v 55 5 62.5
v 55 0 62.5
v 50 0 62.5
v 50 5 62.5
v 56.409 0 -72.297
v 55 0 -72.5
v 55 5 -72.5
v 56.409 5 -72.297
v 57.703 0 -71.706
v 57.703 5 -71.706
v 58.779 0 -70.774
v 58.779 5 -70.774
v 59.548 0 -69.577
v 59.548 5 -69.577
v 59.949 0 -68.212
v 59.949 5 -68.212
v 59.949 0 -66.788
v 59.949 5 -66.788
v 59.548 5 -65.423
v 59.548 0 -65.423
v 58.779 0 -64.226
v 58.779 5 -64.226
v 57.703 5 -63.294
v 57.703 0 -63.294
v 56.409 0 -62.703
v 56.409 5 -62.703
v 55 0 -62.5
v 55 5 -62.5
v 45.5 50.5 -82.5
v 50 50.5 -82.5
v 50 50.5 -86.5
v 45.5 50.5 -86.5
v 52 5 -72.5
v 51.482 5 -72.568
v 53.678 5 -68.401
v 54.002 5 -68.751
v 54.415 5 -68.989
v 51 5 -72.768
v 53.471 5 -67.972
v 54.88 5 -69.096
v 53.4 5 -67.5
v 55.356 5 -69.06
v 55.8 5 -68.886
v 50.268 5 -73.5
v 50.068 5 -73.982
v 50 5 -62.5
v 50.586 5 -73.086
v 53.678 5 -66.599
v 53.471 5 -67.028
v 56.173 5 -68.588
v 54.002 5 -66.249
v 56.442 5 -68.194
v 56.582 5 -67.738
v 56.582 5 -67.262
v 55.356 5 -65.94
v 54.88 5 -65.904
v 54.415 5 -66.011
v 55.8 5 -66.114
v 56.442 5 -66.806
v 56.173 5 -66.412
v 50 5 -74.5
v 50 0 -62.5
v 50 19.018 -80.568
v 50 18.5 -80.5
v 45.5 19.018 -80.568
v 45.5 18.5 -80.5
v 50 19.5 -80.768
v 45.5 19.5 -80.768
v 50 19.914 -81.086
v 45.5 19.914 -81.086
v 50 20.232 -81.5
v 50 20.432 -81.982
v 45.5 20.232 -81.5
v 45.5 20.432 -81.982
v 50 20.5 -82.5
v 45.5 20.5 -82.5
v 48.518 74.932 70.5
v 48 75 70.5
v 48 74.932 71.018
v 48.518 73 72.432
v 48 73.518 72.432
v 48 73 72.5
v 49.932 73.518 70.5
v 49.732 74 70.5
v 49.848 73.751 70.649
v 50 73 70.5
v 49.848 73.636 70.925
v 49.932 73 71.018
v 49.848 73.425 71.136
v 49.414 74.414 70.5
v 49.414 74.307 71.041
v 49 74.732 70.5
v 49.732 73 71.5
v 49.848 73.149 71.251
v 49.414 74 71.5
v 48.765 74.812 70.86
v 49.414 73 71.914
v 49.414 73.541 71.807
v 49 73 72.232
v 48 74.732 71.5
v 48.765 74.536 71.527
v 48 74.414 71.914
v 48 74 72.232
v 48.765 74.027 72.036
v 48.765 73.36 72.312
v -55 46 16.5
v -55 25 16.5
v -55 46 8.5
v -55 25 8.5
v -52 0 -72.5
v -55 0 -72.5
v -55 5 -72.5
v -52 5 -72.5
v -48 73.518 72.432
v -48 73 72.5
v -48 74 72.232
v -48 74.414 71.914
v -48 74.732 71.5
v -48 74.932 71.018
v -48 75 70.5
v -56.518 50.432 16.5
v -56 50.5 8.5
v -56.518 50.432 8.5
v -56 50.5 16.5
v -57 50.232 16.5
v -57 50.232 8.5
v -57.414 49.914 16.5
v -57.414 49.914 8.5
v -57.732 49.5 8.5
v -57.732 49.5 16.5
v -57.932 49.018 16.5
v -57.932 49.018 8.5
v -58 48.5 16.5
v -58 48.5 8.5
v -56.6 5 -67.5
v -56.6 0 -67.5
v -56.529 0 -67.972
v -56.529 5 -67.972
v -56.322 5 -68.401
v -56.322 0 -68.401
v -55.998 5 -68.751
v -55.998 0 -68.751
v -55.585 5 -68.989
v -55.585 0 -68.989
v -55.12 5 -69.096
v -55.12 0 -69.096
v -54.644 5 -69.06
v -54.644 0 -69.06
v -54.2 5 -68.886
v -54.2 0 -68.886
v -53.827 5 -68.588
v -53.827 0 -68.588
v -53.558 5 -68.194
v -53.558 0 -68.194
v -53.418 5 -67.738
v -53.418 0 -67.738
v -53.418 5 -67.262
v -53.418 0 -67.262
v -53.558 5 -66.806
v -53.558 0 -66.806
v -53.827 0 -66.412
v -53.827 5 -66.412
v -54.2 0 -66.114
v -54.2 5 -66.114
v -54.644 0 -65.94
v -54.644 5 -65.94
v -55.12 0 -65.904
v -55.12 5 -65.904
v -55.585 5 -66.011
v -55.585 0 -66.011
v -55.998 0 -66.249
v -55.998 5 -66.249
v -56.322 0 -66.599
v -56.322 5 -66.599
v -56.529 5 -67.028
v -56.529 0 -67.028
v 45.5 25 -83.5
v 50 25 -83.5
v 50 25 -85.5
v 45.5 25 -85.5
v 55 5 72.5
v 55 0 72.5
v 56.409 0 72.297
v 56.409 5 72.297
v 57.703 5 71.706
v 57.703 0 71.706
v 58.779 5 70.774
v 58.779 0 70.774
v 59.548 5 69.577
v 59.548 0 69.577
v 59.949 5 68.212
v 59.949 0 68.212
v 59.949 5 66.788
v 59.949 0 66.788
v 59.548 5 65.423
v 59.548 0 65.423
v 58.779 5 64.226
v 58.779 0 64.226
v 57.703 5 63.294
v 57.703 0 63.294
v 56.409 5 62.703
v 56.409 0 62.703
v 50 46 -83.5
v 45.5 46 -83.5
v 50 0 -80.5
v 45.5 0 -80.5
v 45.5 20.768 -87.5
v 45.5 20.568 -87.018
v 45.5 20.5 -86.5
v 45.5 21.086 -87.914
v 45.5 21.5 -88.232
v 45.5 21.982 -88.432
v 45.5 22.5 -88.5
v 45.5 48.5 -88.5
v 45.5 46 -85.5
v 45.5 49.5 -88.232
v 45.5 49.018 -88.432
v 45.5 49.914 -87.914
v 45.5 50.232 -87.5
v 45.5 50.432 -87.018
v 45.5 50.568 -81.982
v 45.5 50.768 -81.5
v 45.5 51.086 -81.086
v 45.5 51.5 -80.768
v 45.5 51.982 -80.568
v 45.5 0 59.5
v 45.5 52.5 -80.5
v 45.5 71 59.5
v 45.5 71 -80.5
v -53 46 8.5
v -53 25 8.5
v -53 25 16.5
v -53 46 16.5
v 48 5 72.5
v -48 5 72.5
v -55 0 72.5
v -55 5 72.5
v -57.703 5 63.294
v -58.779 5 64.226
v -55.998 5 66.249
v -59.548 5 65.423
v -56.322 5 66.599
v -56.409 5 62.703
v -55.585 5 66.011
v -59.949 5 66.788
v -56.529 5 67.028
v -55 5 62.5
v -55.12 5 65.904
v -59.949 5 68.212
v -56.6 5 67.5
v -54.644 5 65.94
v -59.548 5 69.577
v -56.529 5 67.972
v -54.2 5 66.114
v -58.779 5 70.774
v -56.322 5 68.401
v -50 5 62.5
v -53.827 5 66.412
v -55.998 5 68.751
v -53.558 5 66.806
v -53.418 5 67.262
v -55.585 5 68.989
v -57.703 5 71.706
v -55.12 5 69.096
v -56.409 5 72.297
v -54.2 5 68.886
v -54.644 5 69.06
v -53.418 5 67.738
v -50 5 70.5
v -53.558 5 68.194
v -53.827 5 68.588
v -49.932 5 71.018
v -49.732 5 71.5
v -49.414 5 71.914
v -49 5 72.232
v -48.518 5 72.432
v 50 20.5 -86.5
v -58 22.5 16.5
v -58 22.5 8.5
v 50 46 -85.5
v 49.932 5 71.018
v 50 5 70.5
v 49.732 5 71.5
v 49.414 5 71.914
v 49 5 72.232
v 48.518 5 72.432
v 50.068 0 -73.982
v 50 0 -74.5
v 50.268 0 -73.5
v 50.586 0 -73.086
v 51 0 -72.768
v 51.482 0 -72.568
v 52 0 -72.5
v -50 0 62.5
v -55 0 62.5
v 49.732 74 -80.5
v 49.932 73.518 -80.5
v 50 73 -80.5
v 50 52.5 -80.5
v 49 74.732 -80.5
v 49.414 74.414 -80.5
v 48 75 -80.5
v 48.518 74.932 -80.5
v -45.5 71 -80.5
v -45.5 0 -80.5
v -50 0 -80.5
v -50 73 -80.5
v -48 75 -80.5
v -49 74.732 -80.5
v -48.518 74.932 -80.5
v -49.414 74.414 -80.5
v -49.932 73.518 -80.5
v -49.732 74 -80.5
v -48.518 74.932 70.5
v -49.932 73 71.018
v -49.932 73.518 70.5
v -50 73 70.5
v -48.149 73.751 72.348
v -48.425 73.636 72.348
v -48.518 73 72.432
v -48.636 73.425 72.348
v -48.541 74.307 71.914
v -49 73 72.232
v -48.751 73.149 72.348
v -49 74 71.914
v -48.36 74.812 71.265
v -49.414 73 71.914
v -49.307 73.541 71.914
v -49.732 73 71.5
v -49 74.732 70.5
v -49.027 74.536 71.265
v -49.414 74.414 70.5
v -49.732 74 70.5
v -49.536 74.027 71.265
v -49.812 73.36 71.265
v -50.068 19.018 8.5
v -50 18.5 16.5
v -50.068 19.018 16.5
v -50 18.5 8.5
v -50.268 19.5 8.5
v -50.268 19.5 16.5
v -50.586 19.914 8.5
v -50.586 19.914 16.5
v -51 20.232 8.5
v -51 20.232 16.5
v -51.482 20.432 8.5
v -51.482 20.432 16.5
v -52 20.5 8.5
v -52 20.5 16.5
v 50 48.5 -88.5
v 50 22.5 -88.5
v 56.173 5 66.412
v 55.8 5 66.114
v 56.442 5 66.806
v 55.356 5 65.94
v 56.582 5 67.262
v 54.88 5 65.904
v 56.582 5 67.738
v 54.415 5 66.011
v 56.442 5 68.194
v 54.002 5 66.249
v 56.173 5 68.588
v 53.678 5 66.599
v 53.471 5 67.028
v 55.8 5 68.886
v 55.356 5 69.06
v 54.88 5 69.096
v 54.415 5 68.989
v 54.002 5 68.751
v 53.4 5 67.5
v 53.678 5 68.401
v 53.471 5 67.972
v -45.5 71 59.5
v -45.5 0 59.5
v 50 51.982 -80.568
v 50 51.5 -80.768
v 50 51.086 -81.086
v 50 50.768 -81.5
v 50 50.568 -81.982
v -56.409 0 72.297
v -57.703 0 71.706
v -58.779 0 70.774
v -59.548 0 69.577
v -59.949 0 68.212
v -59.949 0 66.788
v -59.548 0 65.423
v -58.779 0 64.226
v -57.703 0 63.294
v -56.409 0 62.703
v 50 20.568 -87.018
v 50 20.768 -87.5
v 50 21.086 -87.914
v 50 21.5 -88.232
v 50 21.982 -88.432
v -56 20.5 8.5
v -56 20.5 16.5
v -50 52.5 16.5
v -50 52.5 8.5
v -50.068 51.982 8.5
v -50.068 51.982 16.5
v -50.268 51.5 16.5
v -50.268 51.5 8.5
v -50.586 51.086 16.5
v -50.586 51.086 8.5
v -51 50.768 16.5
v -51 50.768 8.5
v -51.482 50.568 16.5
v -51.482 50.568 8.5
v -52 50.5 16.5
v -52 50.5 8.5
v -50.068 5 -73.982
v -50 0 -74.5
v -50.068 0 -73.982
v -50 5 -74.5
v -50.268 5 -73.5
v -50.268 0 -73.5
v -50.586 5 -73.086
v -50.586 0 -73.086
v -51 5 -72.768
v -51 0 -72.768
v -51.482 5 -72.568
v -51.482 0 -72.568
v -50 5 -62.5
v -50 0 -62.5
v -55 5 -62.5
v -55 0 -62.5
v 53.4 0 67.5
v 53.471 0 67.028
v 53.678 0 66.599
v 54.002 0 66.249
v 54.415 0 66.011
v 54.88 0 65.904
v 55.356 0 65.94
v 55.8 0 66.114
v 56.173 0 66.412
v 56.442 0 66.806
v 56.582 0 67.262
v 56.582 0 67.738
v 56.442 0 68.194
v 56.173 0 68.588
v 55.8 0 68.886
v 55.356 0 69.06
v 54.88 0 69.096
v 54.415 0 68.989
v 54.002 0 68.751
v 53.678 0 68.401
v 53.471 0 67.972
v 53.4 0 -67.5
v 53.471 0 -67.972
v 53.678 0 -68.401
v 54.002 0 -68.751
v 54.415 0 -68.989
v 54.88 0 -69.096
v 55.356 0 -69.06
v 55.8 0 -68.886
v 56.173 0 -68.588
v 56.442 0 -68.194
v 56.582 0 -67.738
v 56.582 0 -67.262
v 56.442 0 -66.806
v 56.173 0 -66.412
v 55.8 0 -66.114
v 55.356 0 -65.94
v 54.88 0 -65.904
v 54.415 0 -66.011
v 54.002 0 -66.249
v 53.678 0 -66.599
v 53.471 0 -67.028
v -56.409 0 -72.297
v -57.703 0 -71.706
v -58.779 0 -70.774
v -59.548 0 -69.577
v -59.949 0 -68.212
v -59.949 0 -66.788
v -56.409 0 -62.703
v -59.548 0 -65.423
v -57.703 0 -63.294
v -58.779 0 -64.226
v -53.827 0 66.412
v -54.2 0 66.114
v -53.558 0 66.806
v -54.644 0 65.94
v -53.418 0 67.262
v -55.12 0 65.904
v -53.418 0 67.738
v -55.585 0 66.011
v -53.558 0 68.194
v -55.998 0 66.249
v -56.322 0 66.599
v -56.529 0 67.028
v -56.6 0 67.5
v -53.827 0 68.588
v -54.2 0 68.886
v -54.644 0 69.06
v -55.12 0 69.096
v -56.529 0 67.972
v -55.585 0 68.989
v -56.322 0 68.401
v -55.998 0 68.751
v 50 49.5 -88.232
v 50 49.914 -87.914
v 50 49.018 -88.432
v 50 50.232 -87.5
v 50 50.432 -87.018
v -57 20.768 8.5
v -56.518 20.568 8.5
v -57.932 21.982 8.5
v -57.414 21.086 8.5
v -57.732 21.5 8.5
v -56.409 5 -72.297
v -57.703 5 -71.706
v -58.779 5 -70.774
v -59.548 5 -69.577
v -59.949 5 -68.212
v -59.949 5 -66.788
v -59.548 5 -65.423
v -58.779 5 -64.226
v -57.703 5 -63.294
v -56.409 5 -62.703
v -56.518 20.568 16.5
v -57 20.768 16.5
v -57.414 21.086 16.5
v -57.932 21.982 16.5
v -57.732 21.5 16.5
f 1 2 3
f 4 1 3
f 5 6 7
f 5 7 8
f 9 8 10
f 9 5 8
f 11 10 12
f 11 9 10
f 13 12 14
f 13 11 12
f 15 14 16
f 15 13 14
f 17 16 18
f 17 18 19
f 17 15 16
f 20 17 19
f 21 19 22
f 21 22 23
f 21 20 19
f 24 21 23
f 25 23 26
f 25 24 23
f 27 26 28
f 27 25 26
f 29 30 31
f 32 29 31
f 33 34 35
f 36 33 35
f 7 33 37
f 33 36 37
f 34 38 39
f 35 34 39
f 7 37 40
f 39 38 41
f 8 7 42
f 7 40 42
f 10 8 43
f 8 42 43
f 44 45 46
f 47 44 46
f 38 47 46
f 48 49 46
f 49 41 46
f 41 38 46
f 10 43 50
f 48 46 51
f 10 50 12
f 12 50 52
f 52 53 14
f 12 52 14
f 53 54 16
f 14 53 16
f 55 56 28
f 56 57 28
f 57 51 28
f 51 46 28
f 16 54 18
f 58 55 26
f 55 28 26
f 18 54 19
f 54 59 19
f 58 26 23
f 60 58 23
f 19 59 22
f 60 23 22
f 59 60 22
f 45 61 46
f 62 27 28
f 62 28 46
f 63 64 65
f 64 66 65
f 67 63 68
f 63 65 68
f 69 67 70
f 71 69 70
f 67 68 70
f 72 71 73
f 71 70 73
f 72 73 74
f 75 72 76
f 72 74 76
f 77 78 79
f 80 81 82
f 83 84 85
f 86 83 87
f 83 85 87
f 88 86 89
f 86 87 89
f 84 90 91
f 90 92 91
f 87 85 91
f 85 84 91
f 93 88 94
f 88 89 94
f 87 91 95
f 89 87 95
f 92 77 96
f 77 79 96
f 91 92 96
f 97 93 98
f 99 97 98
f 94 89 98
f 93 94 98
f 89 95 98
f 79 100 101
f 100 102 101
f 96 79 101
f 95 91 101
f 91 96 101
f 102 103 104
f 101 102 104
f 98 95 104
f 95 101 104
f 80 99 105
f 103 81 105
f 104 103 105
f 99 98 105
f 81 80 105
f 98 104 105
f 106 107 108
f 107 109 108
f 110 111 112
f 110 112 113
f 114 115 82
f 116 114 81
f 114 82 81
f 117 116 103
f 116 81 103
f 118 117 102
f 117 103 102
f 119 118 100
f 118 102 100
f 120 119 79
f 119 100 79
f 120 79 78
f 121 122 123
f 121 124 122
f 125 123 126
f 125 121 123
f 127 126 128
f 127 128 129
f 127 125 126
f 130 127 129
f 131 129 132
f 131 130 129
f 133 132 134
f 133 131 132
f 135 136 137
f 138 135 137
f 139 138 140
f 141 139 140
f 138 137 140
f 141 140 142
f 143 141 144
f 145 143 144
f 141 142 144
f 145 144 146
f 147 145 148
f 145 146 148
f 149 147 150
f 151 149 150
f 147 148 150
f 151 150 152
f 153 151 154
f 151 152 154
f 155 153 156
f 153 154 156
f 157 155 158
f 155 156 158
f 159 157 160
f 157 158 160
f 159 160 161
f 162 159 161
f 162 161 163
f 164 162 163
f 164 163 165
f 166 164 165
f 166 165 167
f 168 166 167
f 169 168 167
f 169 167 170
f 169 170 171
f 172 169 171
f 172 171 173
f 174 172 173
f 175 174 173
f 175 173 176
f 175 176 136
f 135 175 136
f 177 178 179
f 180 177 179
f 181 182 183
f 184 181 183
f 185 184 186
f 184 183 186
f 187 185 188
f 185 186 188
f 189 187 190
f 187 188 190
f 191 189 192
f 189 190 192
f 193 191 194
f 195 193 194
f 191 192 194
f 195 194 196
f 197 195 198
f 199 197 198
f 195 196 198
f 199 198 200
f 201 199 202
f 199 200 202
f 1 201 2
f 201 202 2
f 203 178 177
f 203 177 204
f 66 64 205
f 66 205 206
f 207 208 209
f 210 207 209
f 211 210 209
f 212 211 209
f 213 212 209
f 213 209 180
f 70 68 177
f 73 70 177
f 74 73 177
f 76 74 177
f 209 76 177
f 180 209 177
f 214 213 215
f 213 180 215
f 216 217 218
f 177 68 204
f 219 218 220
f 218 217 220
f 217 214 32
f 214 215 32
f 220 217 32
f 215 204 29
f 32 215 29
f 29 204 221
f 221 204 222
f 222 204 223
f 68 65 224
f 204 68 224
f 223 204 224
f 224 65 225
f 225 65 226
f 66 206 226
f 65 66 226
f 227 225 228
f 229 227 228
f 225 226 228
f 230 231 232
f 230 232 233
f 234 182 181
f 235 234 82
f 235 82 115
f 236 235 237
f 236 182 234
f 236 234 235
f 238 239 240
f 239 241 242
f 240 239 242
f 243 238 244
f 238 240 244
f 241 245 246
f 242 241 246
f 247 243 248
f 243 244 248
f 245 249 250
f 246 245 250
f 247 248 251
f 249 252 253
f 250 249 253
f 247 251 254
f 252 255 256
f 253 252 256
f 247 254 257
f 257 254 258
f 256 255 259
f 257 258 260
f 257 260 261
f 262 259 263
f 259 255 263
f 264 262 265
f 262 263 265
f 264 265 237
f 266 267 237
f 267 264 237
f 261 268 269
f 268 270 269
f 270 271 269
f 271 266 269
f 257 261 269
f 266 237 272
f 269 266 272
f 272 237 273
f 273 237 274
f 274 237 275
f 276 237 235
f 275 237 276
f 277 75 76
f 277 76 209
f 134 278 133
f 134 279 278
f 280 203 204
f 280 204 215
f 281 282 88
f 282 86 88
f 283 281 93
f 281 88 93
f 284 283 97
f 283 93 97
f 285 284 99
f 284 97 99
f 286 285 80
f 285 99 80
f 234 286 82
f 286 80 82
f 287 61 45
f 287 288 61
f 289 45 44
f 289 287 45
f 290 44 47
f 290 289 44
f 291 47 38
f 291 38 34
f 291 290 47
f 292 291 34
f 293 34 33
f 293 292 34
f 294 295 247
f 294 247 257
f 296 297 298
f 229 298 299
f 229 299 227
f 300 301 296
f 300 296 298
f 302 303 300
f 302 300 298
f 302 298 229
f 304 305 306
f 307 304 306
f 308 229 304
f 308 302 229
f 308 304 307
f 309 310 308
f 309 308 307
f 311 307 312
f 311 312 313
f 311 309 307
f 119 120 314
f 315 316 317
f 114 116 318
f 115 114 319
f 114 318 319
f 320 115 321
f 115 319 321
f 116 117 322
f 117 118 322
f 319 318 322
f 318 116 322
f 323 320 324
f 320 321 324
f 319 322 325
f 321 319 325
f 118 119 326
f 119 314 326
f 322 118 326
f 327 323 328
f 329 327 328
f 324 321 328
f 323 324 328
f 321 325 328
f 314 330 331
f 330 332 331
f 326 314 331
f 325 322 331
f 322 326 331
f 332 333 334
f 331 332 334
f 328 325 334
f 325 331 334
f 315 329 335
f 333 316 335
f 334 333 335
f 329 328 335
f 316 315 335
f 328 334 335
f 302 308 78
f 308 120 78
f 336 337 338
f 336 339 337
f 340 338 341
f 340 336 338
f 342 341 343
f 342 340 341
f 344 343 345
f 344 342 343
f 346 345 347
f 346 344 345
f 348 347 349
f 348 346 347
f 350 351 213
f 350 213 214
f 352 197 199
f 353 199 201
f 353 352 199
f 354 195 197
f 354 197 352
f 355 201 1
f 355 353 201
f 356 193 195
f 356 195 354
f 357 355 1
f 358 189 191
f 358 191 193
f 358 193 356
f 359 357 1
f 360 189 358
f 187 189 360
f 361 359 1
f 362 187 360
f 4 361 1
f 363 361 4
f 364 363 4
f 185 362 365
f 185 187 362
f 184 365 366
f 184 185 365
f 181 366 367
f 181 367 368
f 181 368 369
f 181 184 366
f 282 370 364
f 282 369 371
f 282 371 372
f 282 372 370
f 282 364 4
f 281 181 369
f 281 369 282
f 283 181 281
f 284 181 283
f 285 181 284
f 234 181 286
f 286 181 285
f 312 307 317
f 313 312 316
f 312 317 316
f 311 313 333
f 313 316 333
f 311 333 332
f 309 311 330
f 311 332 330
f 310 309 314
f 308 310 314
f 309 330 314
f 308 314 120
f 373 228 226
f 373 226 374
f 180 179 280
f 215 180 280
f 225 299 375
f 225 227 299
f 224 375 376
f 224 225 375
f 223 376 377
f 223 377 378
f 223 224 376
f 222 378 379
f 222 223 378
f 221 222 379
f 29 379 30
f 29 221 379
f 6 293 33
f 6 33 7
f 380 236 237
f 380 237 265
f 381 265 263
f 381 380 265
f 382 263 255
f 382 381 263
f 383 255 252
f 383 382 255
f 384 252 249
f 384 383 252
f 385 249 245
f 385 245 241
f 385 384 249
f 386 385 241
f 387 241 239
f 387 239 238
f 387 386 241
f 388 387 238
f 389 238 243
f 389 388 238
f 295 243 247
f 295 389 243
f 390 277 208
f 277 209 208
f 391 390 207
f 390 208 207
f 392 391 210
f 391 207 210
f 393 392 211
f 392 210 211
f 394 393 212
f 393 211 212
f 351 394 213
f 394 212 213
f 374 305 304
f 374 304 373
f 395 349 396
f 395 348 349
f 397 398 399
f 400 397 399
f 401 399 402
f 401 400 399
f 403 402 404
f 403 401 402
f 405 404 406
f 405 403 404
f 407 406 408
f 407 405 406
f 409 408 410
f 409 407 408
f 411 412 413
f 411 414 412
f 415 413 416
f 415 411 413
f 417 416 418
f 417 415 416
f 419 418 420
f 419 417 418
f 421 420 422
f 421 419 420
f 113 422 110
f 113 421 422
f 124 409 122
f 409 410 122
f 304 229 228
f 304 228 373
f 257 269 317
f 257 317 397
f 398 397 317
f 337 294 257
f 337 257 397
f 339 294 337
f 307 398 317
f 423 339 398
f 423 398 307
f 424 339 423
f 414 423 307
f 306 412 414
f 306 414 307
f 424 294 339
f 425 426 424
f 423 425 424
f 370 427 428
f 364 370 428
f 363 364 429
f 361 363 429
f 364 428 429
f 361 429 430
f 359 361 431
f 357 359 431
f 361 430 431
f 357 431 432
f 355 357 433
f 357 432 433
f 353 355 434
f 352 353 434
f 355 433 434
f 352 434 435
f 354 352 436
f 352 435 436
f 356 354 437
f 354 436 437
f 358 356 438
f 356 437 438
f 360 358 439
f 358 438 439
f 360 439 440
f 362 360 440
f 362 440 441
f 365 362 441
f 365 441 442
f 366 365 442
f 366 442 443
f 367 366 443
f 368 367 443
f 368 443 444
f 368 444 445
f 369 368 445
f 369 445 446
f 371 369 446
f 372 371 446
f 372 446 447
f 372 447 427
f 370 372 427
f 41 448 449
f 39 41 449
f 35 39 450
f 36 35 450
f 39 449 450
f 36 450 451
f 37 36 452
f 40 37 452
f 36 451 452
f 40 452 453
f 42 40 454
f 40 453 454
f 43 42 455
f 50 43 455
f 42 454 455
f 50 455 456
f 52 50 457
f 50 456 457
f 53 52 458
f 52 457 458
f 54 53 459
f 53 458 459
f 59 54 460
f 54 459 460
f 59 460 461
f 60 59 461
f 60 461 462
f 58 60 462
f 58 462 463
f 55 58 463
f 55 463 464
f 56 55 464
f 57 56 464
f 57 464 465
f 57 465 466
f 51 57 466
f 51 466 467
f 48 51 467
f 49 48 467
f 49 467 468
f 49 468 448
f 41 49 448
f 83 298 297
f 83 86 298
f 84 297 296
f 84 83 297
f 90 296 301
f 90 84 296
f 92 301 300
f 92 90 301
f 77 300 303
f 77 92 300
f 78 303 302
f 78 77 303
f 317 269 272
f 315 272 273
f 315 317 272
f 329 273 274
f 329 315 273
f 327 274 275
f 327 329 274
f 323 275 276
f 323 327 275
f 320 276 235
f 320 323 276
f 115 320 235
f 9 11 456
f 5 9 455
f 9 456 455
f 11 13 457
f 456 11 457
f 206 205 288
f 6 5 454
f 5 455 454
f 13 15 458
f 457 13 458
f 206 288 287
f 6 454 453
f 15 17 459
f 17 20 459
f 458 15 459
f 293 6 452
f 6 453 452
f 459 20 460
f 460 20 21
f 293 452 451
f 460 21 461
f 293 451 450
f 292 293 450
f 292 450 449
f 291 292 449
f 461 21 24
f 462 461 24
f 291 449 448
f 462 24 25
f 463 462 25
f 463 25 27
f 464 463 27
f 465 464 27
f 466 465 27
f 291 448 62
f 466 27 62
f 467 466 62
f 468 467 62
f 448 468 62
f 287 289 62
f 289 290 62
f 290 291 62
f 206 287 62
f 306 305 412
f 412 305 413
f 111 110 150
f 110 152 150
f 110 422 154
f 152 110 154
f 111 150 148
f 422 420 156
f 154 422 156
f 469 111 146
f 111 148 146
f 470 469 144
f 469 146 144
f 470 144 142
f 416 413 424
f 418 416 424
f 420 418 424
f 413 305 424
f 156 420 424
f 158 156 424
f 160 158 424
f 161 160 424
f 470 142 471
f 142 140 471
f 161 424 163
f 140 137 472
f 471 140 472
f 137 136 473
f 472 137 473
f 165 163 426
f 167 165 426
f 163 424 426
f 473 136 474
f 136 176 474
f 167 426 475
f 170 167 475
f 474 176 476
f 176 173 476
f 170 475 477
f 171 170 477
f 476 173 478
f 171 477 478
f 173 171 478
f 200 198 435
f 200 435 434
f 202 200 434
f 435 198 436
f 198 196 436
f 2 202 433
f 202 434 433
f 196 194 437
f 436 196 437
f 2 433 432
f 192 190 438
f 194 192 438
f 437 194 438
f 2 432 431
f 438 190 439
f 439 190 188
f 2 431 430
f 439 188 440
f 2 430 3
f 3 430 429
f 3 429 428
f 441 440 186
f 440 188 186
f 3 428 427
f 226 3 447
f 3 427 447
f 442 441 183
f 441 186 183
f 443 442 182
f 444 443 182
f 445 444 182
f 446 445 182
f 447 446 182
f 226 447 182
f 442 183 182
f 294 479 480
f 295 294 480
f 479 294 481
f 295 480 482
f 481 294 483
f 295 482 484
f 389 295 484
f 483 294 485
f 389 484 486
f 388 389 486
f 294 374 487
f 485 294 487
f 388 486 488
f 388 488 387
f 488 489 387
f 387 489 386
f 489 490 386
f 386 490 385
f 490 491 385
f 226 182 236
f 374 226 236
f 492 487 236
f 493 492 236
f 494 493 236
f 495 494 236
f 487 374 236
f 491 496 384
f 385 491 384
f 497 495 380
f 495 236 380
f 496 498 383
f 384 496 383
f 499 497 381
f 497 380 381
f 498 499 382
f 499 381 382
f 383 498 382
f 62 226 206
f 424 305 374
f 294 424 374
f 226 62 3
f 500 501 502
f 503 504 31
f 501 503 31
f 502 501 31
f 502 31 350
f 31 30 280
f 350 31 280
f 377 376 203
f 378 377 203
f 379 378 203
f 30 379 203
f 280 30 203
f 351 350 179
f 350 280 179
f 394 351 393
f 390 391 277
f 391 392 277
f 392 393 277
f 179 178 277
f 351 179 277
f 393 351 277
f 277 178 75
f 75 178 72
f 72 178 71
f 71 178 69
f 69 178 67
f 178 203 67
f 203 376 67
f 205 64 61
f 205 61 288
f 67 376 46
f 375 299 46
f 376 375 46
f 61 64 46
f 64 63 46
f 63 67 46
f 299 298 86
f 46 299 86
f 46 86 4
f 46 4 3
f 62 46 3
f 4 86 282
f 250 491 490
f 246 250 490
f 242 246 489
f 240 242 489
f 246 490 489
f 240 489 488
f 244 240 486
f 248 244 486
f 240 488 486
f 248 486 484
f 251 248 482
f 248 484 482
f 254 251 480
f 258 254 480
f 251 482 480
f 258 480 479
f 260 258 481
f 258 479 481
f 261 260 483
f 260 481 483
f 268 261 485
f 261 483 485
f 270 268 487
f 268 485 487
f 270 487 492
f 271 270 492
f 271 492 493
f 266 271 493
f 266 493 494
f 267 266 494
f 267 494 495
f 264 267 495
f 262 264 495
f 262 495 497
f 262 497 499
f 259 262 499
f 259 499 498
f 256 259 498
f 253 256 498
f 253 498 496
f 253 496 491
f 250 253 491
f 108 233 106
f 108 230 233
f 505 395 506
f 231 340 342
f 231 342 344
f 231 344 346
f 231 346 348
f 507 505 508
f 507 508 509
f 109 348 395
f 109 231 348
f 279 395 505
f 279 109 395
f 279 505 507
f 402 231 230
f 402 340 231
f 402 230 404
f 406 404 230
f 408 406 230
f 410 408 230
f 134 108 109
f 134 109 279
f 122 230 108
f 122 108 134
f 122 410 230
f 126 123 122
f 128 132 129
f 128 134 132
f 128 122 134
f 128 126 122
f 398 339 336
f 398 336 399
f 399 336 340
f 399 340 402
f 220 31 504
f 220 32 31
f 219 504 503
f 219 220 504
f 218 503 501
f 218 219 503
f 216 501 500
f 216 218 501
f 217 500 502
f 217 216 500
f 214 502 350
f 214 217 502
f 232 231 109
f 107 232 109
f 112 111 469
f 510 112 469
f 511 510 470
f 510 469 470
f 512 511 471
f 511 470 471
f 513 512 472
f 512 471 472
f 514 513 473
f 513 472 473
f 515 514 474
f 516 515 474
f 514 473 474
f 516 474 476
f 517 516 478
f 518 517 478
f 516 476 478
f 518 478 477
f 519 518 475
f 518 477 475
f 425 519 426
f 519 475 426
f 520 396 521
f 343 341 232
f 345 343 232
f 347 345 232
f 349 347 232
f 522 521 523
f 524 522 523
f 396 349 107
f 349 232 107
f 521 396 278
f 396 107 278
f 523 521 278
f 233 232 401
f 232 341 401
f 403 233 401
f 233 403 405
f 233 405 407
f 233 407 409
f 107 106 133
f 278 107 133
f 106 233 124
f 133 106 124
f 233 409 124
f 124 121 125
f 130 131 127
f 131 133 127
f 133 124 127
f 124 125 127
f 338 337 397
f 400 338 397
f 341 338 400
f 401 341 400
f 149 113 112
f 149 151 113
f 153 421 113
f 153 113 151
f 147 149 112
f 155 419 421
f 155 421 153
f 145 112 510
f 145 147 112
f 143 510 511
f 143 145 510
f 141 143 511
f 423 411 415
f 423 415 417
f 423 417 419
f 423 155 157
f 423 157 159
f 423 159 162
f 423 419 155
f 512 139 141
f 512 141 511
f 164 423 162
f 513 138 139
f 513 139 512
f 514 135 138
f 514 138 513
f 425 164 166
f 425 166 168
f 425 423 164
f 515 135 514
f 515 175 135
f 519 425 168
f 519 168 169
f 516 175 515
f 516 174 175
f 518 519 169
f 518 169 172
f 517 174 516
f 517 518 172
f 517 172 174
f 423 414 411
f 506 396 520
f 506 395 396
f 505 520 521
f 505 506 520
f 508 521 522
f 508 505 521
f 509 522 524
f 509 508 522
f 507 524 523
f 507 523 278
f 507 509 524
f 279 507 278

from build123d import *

# Parameters (mm, degrees)
SKETCH2_W                = 100
SKETCH2_H                = 145
BOSS_EXTRUDE1_DEPTH      = 75
SKETCH3_W                = 91
SKETCH3_H                = 140
CUT_EXTRUDE1_DEPTH       = 71
BOSS_EXTRUDE2_DEPTH      = 5
M3_CLEARANCE_HOLE2_D     = 3.2
M3_CLEARANCE_HOLE2_DEPTH = 12
M3_CLEARANCE_HOLE2_TIP   = 0.96137699
SKETCH11_W               = 8
SKETCH11_H               = 30
SKETCH11_W_2             = 2
SKETCH11_H_2             = 21
BOSS_EXTRUDE4_DEPTH      = 4
SKETCH13_W               = 91
SKETCH13_H               = 71
BOSS_EXTRUDE6_DEPTH      = 8
BOSS_EXTRUDE7_DEPTH      = 8
SKETCH12_W               = 8
SKETCH12_H               = 30
SKETCH12_W_2             = 2
SKETCH12_H_2             = 21
BOSS_EXTRUDE5_DEPTH      = 4.5
FILLET1_R                = 2


with BuildPart() as part:
    # Sketch2 → Boss-Extrude1 (new body)
    with BuildSketch(Plane(origin=(0, 0, 0), x_dir=(1, 0, 0), z_dir=(0, 1, 0))):
        Rectangle(SKETCH2_W, SKETCH2_H)
    extrude(amount=BOSS_EXTRUDE1_DEPTH)

    # Sketch3 → Cut-Extrude1 (cut)
    with BuildSketch(Plane.XZ):
        with Locations((0, -2.5)):
            Rectangle(SKETCH3_W, SKETCH3_H)
    extrude(amount=-CUT_EXTRUDE1_DEPTH, mode=Mode.SUBTRACT)

    # Sketch4 → Boss-Extrude2 (add)
    with BuildSketch(Plane.XZ):
        with BuildLine():
            Line((-50, 72.5), (-55, 72.5))
            ThreePointArc((-55, 72.5), (-60, 67.5), (-55, 62.5))
            Line((-55, 62.5), (-50, 62.5))
            Line((-50, 62.5), (-50, 72.5))
        make_face()
        with BuildLine():
            Line((50, 72.5), (55, 72.5))
            ThreePointArc((55, 72.5), (60, 67.5), (55, 62.5))
            Line((55, 62.5), (50, 62.5))
            Line((50, 62.5), (50, 72.5))
        make_face()
        with BuildLine():
            Line((-50, -72.5), (-55, -72.5))
            ThreePointArc((-55, -72.5), (-60, -67.5), (-55, -62.5))
            Line((-55, -62.5), (-50, -62.5))
            Line((-50, -62.5), (-50, -72.5))
        make_face()
        with BuildLine():
            Line((50, -72.5), (55, -72.5))
            ThreePointArc((55, -72.5), (60, -67.5), (55, -62.5))
            Line((55, -62.5), (50, -62.5))
            Line((50, -62.5), (50, -72.5))
        make_face()
    extrude(amount=-BOSS_EXTRUDE2_DEPTH)

    # M3 Clearance Hole2
    with Locations(Plane(origin=(0, 5, 0), x_dir=(1, 0, 0), z_dir=(0, 1, 0))):
        with Locations((-55, 67.5), (55, 67.5), (55, -67.5), (-55, -67.5)):
            Hole(M3_CLEARANCE_HOLE2_D / 2, depth=M3_CLEARANCE_HOLE2_DEPTH)
            with Locations((0, 0, -(M3_CLEARANCE_HOLE2_DEPTH + M3_CLEARANCE_HOLE2_TIP / 2))):  # 118° drill point
                Cone(0, M3_CLEARANCE_HOLE2_D / 2, M3_CLEARANCE_HOLE2_TIP, mode=Mode.SUBTRACT)

    # Sketch11 → Boss-Extrude4 (add, symmetric)
    with BuildSketch(Plane(origin=(0, 0, 12.5), x_dir=(-1, 0, 0), z_dir=(0, 0, -1))):
        with Locations((54, 35.5)):
            Rectangle(SKETCH11_W, SKETCH11_H)
        with Locations((54, 35.5)):
            Rectangle(SKETCH11_W_2, SKETCH11_H_2, mode=Mode.SUBTRACT)
    extrude(amount=BOSS_EXTRUDE4_DEPTH, both=True)

    # Sketch13 → Boss-Extrude6 (add)
    with BuildSketch(Plane(origin=(0, 0, 67.5), x_dir=(-1, 0, 0), z_dir=(0, 0, -1))):
        with Locations((0, 35.5)):
            Rectangle(SKETCH13_W, SKETCH13_H)
    extrude(amount=BOSS_EXTRUDE6_DEPTH)

    # Sketch15 → Boss-Extrude7 (add)
    with BuildSketch(Plane(origin=(0, 0, -72.5), x_dir=(-1, 0, 0), z_dir=(0, 0, -1))):
        Polygon((-50, 5), (-50, 0), (-45.5, 0), (-45.5, 71), (45.5, 71), (45.5, 0), (50, 0), (50, 5), (50, 75), (-50, 75), align=None)
    extrude(amount=BOSS_EXTRUDE7_DEPTH)

    # Sketch12 → Boss-Extrude5 (add)
    with BuildSketch(Plane(origin=(50, 0, 0), x_dir=(0, 0, -1), z_dir=(1, 0, 0))):
        with Locations((84.5, 35.5)):
            Rectangle(SKETCH12_W, SKETCH12_H)
        with Locations((84.5, 35.5)):
            Rectangle(SKETCH12_W_2, SKETCH12_H_2, mode=Mode.SUBTRACT)
    extrude(amount=-BOSS_EXTRUDE5_DEPTH)

    # Fillet1
    fillet1_edges = [part.edges().sort_by_distance(p)[0] for p in [
        (-50, 50.5, 12.5),
        (-50, 20.5, 12.5),
        (-58, 20.5, 12.5),
        (-58, 50.5, 12.5),
        (-50, 75, -4),
        (-50, 2.5, -72.5),
        (50, 2.5, -72.5),
        (0, 75, 72.5),
        (47.75, 20.5, -88.5),
        (47.75, 50.5, -88.5),
        (47.75, 50.5, -80.5),
        (47.75, 20.5, -80.5),
        (50, 75, -4),
        (50, 40, 72.5),
        (-50, 40, 72.5),
    ]]
    fillet(fillet1_edges, radius=FILLET1_R)


solid = part.part
